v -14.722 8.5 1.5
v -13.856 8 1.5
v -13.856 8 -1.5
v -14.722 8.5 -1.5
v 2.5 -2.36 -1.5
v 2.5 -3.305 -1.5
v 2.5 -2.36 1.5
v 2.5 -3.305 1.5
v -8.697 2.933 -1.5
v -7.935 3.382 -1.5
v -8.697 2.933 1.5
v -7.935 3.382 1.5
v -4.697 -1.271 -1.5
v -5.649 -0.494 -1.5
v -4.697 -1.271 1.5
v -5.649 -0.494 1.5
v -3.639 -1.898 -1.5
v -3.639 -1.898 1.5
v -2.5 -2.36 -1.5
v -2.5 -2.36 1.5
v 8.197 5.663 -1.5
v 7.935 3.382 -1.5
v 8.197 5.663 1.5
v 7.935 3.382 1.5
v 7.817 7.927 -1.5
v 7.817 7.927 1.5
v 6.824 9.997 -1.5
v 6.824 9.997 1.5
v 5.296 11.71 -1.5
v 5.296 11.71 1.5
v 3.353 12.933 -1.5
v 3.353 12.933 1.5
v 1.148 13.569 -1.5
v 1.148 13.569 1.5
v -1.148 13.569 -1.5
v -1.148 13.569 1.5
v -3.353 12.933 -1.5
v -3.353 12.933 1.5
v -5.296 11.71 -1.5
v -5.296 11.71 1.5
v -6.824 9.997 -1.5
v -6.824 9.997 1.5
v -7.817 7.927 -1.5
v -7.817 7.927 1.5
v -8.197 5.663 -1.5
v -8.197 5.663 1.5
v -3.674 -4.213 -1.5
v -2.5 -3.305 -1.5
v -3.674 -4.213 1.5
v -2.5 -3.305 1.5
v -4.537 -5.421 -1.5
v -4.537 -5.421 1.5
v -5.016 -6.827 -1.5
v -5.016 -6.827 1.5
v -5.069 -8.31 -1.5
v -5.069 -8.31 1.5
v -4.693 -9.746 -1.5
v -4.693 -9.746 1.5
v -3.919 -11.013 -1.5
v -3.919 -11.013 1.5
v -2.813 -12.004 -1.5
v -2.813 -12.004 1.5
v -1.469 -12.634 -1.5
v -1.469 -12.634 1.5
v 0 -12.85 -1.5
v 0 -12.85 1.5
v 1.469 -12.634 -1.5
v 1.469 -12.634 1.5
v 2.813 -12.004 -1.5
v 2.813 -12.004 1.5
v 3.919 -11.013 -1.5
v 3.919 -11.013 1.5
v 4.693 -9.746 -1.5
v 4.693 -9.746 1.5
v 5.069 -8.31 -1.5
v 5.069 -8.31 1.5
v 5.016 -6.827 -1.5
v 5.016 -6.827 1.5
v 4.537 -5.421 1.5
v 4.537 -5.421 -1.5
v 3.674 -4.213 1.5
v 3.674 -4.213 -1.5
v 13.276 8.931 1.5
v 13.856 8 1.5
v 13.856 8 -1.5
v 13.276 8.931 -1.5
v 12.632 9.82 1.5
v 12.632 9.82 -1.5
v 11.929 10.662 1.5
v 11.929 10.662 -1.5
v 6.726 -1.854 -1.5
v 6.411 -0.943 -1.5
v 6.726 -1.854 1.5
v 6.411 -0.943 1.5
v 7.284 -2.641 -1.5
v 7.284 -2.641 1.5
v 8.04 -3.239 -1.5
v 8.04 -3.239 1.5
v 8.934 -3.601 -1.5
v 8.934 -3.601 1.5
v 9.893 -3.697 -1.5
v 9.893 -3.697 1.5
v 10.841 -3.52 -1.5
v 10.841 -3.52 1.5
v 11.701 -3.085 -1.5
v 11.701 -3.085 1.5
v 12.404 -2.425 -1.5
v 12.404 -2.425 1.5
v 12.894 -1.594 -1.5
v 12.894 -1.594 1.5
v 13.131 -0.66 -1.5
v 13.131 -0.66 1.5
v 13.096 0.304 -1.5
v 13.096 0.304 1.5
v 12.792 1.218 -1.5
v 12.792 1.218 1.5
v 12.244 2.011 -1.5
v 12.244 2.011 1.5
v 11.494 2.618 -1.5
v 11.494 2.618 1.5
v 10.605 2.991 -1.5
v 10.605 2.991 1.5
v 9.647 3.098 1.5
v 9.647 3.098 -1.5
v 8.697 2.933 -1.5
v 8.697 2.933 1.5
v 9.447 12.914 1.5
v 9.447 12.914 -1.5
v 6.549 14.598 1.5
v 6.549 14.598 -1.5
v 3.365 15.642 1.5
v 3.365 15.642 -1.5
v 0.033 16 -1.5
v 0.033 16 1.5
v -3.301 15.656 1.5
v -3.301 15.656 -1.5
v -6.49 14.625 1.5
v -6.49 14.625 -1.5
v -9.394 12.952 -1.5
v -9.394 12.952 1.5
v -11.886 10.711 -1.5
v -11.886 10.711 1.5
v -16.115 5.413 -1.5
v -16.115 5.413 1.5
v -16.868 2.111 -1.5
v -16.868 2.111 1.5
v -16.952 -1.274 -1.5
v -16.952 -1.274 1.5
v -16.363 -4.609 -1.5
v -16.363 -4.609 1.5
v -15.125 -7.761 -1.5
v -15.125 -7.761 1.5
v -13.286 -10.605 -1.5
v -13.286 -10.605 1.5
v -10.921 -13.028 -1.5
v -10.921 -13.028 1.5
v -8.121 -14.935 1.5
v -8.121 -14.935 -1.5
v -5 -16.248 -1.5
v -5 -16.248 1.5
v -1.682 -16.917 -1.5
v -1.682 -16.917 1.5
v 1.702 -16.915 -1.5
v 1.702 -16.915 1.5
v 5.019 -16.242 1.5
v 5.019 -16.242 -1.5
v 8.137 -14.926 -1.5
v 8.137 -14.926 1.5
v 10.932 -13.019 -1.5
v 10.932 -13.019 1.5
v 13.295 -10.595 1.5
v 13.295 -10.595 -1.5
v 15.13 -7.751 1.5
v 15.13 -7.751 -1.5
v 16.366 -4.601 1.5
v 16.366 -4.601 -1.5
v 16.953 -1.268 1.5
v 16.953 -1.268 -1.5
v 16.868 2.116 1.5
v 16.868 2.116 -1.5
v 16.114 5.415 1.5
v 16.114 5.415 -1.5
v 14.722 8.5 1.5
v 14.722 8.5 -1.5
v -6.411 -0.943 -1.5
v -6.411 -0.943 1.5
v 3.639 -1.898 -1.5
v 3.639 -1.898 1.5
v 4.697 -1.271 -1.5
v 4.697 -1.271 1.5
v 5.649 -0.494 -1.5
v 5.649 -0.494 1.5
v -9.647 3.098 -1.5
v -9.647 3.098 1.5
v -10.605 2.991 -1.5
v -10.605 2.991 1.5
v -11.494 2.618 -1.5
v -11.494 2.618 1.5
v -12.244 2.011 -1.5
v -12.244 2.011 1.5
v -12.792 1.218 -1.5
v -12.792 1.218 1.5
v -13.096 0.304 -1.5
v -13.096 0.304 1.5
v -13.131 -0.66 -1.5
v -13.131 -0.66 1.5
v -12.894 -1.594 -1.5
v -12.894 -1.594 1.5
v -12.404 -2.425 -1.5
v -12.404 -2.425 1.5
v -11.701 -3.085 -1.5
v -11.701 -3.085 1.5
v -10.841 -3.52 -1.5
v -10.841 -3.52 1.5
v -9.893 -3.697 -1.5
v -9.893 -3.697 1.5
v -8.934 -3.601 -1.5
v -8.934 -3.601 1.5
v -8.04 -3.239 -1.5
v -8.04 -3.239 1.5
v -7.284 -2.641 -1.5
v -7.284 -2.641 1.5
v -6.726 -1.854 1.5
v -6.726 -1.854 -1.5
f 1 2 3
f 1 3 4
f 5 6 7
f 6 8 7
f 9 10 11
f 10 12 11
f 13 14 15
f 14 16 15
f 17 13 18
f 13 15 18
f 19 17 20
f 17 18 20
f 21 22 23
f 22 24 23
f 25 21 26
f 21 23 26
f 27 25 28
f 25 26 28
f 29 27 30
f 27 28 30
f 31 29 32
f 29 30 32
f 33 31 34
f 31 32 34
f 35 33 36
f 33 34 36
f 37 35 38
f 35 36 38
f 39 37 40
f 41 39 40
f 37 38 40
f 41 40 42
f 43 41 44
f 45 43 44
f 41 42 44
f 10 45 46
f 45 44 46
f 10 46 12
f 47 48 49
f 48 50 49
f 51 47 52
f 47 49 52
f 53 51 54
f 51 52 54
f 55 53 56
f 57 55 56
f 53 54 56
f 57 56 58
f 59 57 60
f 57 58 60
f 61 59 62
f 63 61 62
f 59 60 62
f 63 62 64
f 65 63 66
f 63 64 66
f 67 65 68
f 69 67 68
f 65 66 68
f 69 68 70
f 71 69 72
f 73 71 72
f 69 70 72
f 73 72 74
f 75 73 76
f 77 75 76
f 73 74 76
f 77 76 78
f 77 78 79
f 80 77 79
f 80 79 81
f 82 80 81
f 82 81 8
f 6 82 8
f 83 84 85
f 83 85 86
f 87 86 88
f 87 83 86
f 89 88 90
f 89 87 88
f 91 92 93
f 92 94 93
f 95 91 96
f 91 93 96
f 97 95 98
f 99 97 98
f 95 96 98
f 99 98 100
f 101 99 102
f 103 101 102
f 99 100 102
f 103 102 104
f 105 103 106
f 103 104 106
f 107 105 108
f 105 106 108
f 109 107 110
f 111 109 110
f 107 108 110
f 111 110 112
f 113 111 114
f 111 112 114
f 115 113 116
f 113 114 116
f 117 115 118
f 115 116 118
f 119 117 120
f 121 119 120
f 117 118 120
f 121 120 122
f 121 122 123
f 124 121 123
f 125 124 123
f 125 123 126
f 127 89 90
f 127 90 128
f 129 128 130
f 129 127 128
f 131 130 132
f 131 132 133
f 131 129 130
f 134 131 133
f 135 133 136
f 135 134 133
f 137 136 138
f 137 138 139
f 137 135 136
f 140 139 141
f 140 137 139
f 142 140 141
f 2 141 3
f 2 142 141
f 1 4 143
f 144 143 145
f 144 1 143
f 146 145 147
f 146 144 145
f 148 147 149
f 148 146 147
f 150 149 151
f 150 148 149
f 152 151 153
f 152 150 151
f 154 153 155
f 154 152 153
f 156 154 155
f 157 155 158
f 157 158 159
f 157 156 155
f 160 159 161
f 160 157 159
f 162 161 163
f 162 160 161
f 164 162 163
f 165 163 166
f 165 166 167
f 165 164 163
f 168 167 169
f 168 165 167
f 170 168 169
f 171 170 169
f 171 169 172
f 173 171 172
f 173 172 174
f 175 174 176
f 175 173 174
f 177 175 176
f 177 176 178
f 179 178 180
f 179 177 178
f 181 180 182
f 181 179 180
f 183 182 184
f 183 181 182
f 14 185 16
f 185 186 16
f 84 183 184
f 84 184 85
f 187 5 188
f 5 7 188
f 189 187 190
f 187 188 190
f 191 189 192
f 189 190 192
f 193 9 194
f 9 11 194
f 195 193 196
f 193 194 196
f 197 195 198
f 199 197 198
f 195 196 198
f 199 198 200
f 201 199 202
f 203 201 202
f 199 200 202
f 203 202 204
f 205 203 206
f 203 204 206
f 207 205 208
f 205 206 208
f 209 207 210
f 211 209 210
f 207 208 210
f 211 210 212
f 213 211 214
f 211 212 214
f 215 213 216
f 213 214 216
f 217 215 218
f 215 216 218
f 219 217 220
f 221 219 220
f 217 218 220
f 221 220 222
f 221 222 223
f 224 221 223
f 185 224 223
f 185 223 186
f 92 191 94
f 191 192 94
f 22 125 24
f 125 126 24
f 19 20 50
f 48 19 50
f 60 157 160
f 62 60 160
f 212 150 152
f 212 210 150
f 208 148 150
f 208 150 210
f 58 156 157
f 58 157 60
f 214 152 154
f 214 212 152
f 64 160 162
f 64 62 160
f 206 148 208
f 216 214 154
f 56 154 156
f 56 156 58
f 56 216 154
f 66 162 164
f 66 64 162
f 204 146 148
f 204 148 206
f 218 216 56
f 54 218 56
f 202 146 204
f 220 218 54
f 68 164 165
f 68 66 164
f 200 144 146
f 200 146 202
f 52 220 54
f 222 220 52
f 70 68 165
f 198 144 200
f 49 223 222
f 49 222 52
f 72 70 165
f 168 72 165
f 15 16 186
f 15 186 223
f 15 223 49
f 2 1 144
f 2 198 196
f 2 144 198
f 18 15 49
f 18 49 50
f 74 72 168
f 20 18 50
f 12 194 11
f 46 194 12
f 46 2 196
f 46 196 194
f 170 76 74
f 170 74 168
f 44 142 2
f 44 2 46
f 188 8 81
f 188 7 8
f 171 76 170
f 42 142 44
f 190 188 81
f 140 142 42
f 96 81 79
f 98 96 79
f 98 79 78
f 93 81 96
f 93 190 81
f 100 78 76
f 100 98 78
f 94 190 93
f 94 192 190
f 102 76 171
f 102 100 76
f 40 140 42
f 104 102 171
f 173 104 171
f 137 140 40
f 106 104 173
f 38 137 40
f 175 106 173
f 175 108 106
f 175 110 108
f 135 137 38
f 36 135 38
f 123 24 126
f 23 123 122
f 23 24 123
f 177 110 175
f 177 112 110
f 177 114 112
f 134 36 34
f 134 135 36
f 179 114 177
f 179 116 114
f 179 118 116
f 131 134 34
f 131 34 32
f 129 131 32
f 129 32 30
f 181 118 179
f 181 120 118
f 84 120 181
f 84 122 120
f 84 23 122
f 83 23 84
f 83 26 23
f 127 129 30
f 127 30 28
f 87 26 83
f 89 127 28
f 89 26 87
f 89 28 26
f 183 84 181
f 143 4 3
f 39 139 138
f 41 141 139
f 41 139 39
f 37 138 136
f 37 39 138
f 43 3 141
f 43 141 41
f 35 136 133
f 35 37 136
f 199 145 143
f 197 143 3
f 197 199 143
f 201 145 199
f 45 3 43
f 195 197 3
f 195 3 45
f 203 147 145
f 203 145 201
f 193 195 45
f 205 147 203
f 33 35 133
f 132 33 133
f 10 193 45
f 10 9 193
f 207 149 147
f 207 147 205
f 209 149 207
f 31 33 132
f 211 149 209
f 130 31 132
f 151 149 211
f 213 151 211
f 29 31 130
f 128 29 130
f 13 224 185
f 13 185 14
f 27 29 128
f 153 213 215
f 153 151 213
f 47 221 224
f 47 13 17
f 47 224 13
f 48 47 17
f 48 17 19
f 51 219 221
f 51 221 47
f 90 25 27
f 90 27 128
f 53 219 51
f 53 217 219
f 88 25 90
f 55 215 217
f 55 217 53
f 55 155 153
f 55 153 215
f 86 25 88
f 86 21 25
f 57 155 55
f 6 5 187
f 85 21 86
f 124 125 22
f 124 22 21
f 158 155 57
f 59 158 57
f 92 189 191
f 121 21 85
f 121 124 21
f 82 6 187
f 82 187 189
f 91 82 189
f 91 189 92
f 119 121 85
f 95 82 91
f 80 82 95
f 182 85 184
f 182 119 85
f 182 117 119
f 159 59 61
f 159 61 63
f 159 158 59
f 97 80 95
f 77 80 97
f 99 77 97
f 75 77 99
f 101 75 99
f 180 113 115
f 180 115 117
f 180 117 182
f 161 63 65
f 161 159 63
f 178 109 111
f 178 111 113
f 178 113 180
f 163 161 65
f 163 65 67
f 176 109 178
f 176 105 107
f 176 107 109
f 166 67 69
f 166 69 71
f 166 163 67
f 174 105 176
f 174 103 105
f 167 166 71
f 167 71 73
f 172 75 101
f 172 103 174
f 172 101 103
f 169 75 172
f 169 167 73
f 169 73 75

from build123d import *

# Parameters (mm, degrees)
EXTRUDE_1_DEPTH                 = 1.5
BOSS_EXTRUDE3_REACH             = 24.677
BOSS_EXTRUDE3_DIRECTION_2_REACH = 24.677


with BuildPart() as part:
    # Эскиз1 → Бобышка-Вытянуть1 (new, symmetric)
    with BuildSketch(Plane.XY):
        with BuildLine():
            ThreePointArc((5, -15.198684154), (15.454813221, -4.141104722), (11.929469096, 10.662446581))
            ThreePointArc((11.929469096, 10.662446581), (-15.454813221, 4.141104722), (5, -15.198684154))
        make_face()
        with BuildLine():
            Line((-2.5, -2.359609465), (-2.5, -3.304777846))
            ThreePointArc((-2.5, -3.304777846), (0, -12.85), (2.5, -3.304777846))
            Line((2.5, -3.304777846), (2.5, -2.359609465))
            ThreePointArc((2.5, -2.359609465), (4.180016715, -1.604605606), (5.649137352, -0.493672869))
            Line((5.649137352, -0.493672869), (6.41139529, -0.943209602))
            ThreePointArc((6.41139529, -0.943209602), (12.678644072, -2.027149068), (8.69732788, 2.932936963))
            Line((8.69732788, 2.932936963), (7.935069942, 3.382473696))
            ThreePointArc((7.935069942, 3.382473696), (0, 13.65), (-7.935069942, 3.382473696))
            Line((-7.935069942, 3.382473696), (-8.69732788, 2.932936963))
            ThreePointArc((-8.69732788, 2.932936963), (-12.678644072, -2.027149068), (-6.41139529, -0.943209602))
            Line((-6.41139529, -0.943209602), (-5.649137352, -0.493672869))
            ThreePointArc((-5.649137352, -0.493672869), (-4.180016715, -1.604605606), (-2.5, -2.359609465))
        make_face(mode=Mode.SUBTRACT)
    extrude(amount=EXTRUDE_1_DEPTH, both=True)

    # Boss-Extrude3: up to this face of the body (flat: up to its plane)
    boss_extrude3_end = Plane(part.part.faces().sort_by_distance((15.017685091, -4.023976592, 1.5))[0])
    # Sketch2 → Boss-Extrude3 (add, up to the picked face)
    with BuildSketch(Plane.XY, mode=Mode.PRIVATE) as boss_extrude3_sk1:
        with BuildLine():
            ThreePointArc((13.856406461, 8), (0, -16), (-13.856406461, 8))
            Line((-13.856406461, 8), (-14.722431864, 8.5))
            ThreePointArc((-14.722431864, 8.5), (-15.822781238, -6.216075442), (-5, -16.248076809))
            ThreePointArc((-5, -16.248076809), (13.294669863, -10.59489279), (14.722431864, 8.5))
            Line((14.722431864, 8.5), (13.856406461, 8))
        make_face()
    boss_extrude3_tool1 = split(extrude(boss_extrude3_sk1.sketch, amount=BOSS_EXTRUDE3_REACH, mode=Mode.PRIVATE), bisect_by=boss_extrude3_end, keep=Keep.BOTH, mode=Mode.PRIVATE)
    add(boss_extrude3_tool1.solids().sort_by(Axis((14.501919, 7.881939, 0), (0, 0, 1)))[0])

    # Boss-Extrude3 direction 2: up to this face of the body (flat: up to its plane)
    boss_extrude3_direction_2_end = Plane(part.part.faces().sort_by_distance((15.017685091, -4.023976592, -1.5))[0])
    # Sketch2 → Boss-Extrude3 direction 2 (add, up to the picked face)
    with BuildSketch(Plane.XY, mode=Mode.PRIVATE) as boss_extrude3_direction_2_sk1:
        with BuildLine():
            ThreePointArc((13.856406461, 8), (0, -16), (-13.856406461, 8))
            Line((-13.856406461, 8), (-14.722431864, 8.5))
            ThreePointArc((-14.722431864, 8.5), (-15.822781238, -6.216075442), (-5, -16.248076809))
            ThreePointArc((-5, -16.248076809), (13.294669863, -10.59489279), (14.722431864, 8.5))
            Line((14.722431864, 8.5), (13.856406461, 8))
        make_face()
    boss_extrude3_direction_2_tool1 = split(extrude(boss_extrude3_direction_2_sk1.sketch, amount=-BOSS_EXTRUDE3_DIRECTION_2_REACH, mode=Mode.PRIVATE), bisect_by=boss_extrude3_direction_2_end, keep=Keep.BOTH, mode=Mode.PRIVATE)
    add(boss_extrude3_direction_2_tool1.solids().sort_by(Axis((14.501919, 7.881939, 0), (0, 0, -1)))[0])


solid = part.part
